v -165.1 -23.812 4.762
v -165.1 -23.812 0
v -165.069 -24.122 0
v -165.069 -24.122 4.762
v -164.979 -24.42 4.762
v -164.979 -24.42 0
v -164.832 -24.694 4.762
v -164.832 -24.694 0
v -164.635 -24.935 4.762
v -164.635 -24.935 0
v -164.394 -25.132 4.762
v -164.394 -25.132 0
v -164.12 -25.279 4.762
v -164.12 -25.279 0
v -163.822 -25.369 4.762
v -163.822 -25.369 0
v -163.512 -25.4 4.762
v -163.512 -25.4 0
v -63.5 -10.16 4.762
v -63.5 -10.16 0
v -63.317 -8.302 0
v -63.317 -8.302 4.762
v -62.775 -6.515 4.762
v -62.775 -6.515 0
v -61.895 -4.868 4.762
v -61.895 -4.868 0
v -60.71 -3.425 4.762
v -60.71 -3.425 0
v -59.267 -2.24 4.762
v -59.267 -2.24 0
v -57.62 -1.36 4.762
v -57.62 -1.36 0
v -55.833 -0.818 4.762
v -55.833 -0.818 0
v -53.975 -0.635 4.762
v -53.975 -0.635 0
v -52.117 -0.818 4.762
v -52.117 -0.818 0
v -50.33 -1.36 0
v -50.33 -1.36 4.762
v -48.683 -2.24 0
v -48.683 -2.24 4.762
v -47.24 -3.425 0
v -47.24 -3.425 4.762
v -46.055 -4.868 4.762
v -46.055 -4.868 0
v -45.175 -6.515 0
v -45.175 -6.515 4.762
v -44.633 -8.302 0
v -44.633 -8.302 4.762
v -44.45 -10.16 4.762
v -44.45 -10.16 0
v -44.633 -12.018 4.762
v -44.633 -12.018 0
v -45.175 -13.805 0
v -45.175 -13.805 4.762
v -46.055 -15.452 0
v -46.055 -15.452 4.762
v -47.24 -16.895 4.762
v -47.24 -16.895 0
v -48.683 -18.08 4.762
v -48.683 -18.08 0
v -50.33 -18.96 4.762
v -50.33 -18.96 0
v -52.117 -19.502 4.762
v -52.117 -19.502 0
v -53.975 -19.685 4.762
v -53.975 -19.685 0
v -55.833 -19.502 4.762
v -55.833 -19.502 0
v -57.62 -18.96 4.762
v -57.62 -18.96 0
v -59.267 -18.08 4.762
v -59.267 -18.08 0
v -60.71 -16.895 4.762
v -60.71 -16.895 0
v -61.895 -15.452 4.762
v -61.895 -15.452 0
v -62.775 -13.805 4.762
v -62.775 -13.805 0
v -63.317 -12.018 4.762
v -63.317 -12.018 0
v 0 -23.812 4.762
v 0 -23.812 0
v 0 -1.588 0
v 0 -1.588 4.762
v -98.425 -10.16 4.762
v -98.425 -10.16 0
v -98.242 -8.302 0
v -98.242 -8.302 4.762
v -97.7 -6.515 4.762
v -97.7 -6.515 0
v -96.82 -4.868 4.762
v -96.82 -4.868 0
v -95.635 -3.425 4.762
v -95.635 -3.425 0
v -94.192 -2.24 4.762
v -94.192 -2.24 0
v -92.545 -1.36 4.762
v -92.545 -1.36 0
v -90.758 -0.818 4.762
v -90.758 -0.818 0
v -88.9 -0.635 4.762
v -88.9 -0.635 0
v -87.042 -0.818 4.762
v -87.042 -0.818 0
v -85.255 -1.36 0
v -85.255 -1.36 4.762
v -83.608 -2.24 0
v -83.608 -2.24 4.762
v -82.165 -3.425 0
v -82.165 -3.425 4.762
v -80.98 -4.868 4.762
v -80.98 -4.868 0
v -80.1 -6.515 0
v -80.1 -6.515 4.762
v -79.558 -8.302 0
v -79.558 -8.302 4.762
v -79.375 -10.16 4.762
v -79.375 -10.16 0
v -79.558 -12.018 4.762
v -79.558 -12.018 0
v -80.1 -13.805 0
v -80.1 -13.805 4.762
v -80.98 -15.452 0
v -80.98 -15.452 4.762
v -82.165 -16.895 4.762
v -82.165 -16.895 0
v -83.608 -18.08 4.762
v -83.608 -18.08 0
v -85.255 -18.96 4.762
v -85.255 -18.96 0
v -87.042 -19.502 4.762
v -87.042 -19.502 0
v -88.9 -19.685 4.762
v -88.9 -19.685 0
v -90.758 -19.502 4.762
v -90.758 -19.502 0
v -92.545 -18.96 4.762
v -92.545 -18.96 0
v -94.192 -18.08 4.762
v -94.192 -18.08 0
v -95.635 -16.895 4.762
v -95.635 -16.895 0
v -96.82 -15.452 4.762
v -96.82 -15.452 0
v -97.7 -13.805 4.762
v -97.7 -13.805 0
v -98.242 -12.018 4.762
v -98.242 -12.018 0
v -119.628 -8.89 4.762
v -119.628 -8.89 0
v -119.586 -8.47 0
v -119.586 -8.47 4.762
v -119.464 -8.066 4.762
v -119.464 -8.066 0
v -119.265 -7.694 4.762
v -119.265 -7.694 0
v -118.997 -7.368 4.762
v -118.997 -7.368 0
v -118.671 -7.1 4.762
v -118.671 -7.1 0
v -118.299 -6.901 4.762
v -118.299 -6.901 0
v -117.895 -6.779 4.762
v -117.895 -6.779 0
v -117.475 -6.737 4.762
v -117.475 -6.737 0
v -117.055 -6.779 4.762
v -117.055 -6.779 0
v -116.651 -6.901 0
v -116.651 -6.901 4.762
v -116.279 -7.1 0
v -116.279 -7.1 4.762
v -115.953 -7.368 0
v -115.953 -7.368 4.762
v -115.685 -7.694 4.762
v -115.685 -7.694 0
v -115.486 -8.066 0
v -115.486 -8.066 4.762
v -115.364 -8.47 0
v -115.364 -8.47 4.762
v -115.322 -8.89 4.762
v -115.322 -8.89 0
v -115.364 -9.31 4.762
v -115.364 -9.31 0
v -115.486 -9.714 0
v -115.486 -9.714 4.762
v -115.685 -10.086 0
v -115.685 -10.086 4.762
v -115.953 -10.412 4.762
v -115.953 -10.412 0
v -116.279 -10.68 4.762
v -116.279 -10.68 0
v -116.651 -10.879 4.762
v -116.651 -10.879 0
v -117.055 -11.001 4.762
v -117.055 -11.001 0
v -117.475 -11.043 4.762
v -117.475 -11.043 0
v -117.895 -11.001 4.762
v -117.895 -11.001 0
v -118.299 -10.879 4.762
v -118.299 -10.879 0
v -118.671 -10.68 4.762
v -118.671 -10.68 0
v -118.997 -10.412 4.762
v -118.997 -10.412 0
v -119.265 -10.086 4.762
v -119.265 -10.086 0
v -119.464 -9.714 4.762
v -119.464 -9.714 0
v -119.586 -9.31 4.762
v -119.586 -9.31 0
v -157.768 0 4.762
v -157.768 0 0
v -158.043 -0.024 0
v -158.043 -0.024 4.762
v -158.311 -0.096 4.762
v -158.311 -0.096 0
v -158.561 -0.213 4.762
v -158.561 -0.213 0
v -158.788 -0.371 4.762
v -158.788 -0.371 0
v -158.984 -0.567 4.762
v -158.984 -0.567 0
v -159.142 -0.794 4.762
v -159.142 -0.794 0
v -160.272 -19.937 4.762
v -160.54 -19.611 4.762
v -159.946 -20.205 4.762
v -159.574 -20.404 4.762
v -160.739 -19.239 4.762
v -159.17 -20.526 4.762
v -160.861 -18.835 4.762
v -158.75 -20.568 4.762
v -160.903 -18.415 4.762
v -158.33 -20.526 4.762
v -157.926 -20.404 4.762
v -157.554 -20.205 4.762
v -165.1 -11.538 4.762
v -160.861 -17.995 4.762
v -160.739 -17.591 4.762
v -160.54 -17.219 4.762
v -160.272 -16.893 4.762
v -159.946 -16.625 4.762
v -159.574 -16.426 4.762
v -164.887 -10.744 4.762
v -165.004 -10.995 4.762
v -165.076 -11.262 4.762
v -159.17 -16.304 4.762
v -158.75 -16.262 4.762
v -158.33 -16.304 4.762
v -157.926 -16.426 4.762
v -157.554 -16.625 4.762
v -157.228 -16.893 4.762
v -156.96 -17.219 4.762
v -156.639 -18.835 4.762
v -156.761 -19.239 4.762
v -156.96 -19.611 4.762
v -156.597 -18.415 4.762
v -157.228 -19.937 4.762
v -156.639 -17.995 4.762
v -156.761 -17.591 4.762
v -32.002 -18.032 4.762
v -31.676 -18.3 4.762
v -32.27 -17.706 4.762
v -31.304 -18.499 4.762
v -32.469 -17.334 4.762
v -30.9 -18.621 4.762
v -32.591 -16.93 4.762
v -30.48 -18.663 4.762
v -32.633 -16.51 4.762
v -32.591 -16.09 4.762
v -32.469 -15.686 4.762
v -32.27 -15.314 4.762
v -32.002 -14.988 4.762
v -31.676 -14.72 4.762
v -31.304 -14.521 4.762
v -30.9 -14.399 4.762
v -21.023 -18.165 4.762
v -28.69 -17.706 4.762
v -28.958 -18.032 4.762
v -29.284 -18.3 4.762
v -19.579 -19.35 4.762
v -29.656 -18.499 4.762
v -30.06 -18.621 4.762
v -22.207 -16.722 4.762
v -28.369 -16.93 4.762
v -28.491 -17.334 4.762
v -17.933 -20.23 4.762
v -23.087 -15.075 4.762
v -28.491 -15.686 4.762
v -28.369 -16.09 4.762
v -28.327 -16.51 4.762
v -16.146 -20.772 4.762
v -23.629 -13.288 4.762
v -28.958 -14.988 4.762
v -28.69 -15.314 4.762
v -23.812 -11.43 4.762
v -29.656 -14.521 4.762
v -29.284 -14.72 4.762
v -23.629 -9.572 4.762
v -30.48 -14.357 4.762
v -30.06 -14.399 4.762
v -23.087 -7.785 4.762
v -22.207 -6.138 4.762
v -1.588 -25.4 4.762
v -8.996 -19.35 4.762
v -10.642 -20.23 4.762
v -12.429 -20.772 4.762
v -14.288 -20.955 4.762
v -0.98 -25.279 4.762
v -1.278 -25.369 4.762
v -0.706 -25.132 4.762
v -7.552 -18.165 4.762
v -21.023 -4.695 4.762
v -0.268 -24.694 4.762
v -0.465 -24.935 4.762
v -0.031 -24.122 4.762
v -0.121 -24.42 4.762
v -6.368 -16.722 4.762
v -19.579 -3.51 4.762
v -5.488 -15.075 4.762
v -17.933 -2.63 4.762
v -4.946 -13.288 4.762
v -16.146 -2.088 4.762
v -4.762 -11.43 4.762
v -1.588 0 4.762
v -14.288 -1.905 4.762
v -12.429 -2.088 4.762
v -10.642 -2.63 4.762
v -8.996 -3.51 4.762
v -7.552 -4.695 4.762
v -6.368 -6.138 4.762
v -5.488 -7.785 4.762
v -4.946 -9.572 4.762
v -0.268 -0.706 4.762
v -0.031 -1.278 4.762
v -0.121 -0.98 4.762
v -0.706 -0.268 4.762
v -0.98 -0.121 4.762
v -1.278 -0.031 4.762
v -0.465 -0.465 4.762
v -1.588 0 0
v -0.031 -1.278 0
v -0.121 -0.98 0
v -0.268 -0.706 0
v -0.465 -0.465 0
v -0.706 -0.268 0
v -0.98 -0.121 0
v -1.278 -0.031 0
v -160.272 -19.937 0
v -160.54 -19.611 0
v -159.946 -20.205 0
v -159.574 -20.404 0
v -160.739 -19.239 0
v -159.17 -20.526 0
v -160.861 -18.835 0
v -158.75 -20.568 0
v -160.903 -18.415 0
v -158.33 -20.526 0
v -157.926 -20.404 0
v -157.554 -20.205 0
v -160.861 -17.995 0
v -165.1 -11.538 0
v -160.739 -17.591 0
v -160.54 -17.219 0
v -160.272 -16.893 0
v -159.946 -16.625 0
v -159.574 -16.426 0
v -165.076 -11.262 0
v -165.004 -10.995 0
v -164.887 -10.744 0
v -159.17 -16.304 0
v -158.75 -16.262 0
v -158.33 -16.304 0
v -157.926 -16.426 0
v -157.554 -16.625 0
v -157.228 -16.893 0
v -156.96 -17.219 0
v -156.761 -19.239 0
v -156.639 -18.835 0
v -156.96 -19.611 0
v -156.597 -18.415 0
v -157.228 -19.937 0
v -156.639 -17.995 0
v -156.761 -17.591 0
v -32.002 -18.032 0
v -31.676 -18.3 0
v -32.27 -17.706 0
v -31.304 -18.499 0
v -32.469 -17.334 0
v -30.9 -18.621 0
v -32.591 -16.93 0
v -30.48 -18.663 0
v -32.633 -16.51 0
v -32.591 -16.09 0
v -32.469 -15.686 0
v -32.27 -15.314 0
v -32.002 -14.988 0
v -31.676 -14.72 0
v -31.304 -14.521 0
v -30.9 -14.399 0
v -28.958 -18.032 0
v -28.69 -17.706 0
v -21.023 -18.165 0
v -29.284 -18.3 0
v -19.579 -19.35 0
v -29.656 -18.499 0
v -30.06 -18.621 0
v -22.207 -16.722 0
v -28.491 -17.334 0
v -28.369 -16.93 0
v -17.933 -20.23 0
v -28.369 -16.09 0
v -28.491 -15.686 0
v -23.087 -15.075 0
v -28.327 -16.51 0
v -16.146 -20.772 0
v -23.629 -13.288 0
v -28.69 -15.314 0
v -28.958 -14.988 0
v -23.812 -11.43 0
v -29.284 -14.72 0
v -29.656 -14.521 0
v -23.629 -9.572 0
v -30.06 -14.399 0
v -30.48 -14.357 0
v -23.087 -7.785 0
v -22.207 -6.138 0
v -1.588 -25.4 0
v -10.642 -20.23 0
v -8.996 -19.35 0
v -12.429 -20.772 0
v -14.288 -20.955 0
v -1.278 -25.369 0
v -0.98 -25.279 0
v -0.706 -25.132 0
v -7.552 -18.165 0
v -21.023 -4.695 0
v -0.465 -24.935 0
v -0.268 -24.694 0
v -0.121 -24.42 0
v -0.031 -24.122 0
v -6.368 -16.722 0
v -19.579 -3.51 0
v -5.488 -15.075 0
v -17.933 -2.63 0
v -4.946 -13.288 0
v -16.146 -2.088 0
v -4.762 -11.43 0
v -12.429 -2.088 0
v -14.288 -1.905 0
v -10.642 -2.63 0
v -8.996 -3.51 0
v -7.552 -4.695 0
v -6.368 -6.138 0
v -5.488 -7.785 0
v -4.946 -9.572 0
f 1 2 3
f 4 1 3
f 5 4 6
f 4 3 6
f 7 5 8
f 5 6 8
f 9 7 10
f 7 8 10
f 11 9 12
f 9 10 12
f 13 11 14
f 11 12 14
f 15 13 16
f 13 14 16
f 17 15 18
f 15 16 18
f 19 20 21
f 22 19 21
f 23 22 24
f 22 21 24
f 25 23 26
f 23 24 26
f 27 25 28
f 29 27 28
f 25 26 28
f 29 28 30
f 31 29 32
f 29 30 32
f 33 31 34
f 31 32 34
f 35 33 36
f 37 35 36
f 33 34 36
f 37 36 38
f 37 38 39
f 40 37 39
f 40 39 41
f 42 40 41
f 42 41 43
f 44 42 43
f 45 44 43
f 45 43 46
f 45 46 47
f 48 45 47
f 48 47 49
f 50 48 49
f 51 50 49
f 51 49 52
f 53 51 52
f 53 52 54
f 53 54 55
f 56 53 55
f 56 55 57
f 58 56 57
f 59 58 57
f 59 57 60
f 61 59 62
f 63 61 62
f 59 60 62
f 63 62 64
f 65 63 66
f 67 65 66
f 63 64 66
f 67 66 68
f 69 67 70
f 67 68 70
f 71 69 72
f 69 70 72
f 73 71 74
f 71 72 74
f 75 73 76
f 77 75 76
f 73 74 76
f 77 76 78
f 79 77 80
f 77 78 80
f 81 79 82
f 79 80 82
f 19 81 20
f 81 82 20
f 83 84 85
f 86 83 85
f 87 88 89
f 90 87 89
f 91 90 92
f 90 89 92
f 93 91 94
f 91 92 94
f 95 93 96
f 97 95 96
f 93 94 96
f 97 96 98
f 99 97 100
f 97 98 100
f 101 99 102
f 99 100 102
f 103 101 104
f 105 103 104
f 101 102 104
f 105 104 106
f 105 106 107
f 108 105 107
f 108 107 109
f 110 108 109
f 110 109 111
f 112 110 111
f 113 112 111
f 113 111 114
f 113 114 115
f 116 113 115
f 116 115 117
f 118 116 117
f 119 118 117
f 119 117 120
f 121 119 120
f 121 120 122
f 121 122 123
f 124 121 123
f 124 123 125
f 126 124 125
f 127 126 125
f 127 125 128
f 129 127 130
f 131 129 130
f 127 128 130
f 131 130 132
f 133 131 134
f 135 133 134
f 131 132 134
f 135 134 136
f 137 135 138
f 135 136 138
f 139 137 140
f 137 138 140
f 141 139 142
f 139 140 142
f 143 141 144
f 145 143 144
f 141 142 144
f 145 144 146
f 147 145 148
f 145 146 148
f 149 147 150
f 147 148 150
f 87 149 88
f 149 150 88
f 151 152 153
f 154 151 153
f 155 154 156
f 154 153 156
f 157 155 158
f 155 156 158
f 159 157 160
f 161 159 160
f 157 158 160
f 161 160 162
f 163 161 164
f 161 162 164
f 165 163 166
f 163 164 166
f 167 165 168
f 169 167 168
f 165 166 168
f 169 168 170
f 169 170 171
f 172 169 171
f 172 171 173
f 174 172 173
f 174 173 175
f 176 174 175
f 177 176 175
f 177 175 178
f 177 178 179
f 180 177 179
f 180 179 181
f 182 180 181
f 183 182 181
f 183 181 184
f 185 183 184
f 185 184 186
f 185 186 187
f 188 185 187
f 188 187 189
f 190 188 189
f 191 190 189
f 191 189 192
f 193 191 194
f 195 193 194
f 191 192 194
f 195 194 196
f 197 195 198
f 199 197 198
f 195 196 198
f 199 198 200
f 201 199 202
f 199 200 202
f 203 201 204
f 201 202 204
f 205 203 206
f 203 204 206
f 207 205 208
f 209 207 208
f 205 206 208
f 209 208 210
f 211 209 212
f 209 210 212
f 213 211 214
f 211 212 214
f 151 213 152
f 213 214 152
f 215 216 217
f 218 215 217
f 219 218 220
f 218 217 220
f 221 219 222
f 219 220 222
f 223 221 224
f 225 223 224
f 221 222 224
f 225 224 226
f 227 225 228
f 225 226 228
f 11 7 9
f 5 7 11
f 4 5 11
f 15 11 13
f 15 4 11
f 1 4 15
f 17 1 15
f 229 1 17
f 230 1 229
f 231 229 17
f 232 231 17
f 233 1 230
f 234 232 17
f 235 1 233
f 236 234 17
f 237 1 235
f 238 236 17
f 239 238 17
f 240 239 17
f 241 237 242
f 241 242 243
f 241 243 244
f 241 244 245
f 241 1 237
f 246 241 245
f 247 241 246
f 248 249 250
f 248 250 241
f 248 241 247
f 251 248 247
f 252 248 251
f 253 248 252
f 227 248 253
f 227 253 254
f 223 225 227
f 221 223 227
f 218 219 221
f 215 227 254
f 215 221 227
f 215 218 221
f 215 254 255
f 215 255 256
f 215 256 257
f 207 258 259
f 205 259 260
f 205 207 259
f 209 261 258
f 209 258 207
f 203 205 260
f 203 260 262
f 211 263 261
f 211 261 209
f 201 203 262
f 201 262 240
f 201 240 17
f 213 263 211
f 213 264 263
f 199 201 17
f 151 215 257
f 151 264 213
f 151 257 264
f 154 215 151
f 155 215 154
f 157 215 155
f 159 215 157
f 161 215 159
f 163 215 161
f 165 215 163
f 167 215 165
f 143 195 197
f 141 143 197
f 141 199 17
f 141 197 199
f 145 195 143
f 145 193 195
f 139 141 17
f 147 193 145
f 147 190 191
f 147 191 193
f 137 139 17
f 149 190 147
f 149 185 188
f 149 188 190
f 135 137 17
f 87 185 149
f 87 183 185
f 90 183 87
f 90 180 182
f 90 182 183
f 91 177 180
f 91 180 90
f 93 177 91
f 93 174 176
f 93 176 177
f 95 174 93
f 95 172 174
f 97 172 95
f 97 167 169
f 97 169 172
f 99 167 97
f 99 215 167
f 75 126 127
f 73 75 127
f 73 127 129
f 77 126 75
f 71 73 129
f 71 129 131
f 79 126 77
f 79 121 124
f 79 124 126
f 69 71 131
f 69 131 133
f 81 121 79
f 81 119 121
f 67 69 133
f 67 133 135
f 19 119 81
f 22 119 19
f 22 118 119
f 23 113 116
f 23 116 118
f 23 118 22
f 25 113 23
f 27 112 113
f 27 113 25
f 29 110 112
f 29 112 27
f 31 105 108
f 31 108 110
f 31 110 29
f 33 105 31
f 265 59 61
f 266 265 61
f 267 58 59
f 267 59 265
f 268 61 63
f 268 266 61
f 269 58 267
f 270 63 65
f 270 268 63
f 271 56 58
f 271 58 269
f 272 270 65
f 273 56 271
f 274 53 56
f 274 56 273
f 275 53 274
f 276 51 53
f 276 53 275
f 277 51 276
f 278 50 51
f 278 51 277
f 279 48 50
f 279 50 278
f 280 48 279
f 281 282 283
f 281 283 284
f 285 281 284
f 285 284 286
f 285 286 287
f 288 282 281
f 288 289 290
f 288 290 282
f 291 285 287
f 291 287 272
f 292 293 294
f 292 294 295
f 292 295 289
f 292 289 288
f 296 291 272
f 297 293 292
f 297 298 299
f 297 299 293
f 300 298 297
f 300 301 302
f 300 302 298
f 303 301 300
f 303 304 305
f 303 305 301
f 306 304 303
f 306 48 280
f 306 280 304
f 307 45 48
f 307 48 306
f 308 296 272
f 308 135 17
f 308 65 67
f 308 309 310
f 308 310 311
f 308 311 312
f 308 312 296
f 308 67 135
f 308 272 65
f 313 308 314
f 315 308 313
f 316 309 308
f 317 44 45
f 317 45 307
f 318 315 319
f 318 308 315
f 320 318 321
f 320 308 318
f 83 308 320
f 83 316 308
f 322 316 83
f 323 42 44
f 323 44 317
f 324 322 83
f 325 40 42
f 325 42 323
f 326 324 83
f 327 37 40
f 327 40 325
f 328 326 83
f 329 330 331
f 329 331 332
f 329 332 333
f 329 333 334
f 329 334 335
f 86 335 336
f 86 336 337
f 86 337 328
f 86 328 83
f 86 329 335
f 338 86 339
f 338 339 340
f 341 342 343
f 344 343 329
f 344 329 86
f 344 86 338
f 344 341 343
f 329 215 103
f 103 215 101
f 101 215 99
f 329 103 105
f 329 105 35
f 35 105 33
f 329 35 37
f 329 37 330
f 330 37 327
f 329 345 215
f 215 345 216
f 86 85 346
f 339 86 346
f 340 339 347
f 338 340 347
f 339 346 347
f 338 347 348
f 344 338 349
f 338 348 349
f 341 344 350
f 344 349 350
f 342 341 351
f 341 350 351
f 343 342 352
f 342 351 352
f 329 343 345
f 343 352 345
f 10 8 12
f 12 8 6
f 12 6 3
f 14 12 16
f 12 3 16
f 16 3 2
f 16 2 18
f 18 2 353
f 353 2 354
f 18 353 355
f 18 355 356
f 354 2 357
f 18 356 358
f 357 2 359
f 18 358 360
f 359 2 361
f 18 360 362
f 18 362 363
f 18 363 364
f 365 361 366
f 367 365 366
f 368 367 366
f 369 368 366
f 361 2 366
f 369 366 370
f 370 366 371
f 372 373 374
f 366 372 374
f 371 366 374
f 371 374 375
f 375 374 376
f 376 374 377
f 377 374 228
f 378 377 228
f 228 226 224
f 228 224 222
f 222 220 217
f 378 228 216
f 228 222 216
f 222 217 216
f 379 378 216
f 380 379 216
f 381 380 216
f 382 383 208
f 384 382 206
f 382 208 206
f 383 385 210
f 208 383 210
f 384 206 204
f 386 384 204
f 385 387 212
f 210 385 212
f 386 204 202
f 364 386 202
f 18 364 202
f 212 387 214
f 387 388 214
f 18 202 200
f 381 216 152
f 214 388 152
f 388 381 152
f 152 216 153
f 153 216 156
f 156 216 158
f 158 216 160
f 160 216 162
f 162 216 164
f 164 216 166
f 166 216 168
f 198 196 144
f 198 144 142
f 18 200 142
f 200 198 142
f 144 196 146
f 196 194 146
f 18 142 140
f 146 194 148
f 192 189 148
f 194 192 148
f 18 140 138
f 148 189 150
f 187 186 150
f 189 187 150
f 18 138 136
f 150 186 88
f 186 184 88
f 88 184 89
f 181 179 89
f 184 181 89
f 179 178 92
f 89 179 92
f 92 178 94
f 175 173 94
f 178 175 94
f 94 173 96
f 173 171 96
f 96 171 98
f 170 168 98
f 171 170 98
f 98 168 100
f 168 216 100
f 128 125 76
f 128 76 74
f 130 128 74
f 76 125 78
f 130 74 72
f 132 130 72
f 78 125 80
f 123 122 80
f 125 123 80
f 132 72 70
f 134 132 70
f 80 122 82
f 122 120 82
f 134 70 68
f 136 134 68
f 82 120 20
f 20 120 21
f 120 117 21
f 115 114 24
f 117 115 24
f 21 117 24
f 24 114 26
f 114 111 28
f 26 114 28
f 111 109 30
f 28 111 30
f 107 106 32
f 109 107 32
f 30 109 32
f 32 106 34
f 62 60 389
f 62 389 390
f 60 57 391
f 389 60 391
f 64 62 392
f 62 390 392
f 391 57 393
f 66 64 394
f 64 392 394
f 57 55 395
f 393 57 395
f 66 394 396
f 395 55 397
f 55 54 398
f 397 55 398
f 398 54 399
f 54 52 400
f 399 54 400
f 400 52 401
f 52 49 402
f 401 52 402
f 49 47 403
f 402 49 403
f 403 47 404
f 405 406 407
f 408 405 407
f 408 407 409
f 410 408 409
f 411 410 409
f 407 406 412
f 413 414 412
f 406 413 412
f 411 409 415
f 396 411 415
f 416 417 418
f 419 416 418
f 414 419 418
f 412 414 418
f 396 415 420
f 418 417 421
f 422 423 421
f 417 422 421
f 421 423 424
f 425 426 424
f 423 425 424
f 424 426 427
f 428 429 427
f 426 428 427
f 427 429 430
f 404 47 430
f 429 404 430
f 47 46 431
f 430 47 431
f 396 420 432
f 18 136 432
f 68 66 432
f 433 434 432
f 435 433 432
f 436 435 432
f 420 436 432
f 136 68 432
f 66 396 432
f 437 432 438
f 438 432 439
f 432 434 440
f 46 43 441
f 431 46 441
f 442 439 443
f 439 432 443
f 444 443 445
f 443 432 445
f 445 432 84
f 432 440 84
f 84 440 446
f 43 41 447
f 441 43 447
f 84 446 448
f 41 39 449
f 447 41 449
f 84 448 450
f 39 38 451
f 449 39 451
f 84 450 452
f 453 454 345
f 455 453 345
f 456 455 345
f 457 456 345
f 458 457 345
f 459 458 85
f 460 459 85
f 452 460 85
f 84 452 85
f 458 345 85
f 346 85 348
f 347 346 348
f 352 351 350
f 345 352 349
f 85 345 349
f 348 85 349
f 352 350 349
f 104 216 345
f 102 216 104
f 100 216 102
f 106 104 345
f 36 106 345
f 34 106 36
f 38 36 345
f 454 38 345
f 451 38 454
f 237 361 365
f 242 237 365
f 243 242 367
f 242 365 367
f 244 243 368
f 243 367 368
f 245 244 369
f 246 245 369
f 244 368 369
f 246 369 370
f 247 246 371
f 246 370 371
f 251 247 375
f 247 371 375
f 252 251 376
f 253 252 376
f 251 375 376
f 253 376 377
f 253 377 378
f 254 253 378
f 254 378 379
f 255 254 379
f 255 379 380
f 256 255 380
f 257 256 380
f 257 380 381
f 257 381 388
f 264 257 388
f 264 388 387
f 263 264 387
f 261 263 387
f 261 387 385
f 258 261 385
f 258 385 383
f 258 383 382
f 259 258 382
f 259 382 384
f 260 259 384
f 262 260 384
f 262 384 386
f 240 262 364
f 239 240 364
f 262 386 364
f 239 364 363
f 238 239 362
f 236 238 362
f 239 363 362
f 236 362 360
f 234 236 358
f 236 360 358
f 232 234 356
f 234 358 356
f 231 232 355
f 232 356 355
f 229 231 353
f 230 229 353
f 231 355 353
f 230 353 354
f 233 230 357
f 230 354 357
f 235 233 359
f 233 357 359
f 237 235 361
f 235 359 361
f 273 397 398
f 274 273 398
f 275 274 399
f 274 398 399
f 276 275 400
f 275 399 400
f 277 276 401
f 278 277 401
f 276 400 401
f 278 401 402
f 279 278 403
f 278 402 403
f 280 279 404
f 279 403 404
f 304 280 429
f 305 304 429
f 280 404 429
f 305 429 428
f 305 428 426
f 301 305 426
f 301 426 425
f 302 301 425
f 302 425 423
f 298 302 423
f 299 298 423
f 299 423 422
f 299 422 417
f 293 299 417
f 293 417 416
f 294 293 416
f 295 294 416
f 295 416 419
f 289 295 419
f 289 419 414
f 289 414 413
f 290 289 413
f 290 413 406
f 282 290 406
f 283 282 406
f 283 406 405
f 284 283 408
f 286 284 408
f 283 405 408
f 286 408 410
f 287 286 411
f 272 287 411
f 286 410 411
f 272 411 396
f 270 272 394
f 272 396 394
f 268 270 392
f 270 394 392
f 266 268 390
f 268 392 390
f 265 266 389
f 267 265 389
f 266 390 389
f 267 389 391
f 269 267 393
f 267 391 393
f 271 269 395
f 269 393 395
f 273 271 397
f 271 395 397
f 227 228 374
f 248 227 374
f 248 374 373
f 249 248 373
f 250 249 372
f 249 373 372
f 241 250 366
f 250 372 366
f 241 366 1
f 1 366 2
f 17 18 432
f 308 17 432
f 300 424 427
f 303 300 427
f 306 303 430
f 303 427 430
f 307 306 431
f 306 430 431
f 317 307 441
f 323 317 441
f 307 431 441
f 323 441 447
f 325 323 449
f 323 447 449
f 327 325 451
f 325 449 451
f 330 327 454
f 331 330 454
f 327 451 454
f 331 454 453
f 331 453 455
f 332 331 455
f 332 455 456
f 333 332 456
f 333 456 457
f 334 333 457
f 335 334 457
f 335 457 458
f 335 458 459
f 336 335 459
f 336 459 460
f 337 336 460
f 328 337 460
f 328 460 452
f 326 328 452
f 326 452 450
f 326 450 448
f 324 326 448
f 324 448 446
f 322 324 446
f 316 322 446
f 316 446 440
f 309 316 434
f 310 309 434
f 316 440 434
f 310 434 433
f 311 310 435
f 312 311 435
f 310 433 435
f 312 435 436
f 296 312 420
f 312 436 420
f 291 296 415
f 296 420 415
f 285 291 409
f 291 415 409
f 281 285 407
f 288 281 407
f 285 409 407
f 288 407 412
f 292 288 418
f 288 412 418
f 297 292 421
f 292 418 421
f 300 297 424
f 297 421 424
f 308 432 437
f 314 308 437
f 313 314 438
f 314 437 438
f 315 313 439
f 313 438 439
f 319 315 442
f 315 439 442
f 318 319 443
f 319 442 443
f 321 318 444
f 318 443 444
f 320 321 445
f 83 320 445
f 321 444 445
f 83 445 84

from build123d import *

# Parameters (mm, degrees)
BOSS_EXTRUDE1_DEPTH         = 4.7625
F_6_CLEARANCE_HOLE1_D       = 4.3053
F_3_4_0_75_DIAMETER_HOLE1_D = 19.05


with BuildPart() as part:
    # Sketch1 → Boss-Extrude1 (new body)
    with BuildSketch(Plane.XY):
        with BuildLine():
            Line((-159.14246691, -0.79375), (-164.887315329, -10.744119343))
            ThreePointArc((-164.887315329, -10.744119343), (-165.045907249, -11.126994109), (-165.1, -11.537869343))
            Line((-165.1, -11.537869343), (-165.1, -23.8125))
            ThreePointArc((-165.1, -23.8125), (-164.635032015, -24.935032015), (-163.5125, -25.4))
            Line((-163.5125, -25.4), (-1.5875, -25.4))
            ThreePointArc((-1.5875, -25.4), (-0.464967985, -24.935032015), (0, -23.8125))
            Line((0, -23.8125), (0, -1.5875))
            ThreePointArc((0, -1.5875), (-0.464967985, -0.464967985), (-1.5875, 0))
            Line((-1.5875, 0), (-157.767651581, 0))
            ThreePointArc((-157.767651581, 0), (-158.561401581, -0.212684671), (-159.14246691, -0.79375))
        make_face()
    extrude(amount=BOSS_EXTRUDE1_DEPTH)

    # #6 Clearance Hole1 (through all)
    with Locations(Plane.XY.offset(4.7625)):
        with Locations((-158.75, -18.415), (-117.475, -8.89), (-30.48, -16.51)):
            Hole(F_6_CLEARANCE_HOLE1_D / 2)

    # 3/4 (0.75) Diameter Hole1 (through all)
    with Locations(Plane.XY.offset(4.7625)):
        with Locations((-88.9, -10.16), (-53.975, -10.16), (-14.2875, -11.43)):
            Hole(F_3_4_0_75_DIAMETER_HOLE1_D / 2)


solid = part.part
